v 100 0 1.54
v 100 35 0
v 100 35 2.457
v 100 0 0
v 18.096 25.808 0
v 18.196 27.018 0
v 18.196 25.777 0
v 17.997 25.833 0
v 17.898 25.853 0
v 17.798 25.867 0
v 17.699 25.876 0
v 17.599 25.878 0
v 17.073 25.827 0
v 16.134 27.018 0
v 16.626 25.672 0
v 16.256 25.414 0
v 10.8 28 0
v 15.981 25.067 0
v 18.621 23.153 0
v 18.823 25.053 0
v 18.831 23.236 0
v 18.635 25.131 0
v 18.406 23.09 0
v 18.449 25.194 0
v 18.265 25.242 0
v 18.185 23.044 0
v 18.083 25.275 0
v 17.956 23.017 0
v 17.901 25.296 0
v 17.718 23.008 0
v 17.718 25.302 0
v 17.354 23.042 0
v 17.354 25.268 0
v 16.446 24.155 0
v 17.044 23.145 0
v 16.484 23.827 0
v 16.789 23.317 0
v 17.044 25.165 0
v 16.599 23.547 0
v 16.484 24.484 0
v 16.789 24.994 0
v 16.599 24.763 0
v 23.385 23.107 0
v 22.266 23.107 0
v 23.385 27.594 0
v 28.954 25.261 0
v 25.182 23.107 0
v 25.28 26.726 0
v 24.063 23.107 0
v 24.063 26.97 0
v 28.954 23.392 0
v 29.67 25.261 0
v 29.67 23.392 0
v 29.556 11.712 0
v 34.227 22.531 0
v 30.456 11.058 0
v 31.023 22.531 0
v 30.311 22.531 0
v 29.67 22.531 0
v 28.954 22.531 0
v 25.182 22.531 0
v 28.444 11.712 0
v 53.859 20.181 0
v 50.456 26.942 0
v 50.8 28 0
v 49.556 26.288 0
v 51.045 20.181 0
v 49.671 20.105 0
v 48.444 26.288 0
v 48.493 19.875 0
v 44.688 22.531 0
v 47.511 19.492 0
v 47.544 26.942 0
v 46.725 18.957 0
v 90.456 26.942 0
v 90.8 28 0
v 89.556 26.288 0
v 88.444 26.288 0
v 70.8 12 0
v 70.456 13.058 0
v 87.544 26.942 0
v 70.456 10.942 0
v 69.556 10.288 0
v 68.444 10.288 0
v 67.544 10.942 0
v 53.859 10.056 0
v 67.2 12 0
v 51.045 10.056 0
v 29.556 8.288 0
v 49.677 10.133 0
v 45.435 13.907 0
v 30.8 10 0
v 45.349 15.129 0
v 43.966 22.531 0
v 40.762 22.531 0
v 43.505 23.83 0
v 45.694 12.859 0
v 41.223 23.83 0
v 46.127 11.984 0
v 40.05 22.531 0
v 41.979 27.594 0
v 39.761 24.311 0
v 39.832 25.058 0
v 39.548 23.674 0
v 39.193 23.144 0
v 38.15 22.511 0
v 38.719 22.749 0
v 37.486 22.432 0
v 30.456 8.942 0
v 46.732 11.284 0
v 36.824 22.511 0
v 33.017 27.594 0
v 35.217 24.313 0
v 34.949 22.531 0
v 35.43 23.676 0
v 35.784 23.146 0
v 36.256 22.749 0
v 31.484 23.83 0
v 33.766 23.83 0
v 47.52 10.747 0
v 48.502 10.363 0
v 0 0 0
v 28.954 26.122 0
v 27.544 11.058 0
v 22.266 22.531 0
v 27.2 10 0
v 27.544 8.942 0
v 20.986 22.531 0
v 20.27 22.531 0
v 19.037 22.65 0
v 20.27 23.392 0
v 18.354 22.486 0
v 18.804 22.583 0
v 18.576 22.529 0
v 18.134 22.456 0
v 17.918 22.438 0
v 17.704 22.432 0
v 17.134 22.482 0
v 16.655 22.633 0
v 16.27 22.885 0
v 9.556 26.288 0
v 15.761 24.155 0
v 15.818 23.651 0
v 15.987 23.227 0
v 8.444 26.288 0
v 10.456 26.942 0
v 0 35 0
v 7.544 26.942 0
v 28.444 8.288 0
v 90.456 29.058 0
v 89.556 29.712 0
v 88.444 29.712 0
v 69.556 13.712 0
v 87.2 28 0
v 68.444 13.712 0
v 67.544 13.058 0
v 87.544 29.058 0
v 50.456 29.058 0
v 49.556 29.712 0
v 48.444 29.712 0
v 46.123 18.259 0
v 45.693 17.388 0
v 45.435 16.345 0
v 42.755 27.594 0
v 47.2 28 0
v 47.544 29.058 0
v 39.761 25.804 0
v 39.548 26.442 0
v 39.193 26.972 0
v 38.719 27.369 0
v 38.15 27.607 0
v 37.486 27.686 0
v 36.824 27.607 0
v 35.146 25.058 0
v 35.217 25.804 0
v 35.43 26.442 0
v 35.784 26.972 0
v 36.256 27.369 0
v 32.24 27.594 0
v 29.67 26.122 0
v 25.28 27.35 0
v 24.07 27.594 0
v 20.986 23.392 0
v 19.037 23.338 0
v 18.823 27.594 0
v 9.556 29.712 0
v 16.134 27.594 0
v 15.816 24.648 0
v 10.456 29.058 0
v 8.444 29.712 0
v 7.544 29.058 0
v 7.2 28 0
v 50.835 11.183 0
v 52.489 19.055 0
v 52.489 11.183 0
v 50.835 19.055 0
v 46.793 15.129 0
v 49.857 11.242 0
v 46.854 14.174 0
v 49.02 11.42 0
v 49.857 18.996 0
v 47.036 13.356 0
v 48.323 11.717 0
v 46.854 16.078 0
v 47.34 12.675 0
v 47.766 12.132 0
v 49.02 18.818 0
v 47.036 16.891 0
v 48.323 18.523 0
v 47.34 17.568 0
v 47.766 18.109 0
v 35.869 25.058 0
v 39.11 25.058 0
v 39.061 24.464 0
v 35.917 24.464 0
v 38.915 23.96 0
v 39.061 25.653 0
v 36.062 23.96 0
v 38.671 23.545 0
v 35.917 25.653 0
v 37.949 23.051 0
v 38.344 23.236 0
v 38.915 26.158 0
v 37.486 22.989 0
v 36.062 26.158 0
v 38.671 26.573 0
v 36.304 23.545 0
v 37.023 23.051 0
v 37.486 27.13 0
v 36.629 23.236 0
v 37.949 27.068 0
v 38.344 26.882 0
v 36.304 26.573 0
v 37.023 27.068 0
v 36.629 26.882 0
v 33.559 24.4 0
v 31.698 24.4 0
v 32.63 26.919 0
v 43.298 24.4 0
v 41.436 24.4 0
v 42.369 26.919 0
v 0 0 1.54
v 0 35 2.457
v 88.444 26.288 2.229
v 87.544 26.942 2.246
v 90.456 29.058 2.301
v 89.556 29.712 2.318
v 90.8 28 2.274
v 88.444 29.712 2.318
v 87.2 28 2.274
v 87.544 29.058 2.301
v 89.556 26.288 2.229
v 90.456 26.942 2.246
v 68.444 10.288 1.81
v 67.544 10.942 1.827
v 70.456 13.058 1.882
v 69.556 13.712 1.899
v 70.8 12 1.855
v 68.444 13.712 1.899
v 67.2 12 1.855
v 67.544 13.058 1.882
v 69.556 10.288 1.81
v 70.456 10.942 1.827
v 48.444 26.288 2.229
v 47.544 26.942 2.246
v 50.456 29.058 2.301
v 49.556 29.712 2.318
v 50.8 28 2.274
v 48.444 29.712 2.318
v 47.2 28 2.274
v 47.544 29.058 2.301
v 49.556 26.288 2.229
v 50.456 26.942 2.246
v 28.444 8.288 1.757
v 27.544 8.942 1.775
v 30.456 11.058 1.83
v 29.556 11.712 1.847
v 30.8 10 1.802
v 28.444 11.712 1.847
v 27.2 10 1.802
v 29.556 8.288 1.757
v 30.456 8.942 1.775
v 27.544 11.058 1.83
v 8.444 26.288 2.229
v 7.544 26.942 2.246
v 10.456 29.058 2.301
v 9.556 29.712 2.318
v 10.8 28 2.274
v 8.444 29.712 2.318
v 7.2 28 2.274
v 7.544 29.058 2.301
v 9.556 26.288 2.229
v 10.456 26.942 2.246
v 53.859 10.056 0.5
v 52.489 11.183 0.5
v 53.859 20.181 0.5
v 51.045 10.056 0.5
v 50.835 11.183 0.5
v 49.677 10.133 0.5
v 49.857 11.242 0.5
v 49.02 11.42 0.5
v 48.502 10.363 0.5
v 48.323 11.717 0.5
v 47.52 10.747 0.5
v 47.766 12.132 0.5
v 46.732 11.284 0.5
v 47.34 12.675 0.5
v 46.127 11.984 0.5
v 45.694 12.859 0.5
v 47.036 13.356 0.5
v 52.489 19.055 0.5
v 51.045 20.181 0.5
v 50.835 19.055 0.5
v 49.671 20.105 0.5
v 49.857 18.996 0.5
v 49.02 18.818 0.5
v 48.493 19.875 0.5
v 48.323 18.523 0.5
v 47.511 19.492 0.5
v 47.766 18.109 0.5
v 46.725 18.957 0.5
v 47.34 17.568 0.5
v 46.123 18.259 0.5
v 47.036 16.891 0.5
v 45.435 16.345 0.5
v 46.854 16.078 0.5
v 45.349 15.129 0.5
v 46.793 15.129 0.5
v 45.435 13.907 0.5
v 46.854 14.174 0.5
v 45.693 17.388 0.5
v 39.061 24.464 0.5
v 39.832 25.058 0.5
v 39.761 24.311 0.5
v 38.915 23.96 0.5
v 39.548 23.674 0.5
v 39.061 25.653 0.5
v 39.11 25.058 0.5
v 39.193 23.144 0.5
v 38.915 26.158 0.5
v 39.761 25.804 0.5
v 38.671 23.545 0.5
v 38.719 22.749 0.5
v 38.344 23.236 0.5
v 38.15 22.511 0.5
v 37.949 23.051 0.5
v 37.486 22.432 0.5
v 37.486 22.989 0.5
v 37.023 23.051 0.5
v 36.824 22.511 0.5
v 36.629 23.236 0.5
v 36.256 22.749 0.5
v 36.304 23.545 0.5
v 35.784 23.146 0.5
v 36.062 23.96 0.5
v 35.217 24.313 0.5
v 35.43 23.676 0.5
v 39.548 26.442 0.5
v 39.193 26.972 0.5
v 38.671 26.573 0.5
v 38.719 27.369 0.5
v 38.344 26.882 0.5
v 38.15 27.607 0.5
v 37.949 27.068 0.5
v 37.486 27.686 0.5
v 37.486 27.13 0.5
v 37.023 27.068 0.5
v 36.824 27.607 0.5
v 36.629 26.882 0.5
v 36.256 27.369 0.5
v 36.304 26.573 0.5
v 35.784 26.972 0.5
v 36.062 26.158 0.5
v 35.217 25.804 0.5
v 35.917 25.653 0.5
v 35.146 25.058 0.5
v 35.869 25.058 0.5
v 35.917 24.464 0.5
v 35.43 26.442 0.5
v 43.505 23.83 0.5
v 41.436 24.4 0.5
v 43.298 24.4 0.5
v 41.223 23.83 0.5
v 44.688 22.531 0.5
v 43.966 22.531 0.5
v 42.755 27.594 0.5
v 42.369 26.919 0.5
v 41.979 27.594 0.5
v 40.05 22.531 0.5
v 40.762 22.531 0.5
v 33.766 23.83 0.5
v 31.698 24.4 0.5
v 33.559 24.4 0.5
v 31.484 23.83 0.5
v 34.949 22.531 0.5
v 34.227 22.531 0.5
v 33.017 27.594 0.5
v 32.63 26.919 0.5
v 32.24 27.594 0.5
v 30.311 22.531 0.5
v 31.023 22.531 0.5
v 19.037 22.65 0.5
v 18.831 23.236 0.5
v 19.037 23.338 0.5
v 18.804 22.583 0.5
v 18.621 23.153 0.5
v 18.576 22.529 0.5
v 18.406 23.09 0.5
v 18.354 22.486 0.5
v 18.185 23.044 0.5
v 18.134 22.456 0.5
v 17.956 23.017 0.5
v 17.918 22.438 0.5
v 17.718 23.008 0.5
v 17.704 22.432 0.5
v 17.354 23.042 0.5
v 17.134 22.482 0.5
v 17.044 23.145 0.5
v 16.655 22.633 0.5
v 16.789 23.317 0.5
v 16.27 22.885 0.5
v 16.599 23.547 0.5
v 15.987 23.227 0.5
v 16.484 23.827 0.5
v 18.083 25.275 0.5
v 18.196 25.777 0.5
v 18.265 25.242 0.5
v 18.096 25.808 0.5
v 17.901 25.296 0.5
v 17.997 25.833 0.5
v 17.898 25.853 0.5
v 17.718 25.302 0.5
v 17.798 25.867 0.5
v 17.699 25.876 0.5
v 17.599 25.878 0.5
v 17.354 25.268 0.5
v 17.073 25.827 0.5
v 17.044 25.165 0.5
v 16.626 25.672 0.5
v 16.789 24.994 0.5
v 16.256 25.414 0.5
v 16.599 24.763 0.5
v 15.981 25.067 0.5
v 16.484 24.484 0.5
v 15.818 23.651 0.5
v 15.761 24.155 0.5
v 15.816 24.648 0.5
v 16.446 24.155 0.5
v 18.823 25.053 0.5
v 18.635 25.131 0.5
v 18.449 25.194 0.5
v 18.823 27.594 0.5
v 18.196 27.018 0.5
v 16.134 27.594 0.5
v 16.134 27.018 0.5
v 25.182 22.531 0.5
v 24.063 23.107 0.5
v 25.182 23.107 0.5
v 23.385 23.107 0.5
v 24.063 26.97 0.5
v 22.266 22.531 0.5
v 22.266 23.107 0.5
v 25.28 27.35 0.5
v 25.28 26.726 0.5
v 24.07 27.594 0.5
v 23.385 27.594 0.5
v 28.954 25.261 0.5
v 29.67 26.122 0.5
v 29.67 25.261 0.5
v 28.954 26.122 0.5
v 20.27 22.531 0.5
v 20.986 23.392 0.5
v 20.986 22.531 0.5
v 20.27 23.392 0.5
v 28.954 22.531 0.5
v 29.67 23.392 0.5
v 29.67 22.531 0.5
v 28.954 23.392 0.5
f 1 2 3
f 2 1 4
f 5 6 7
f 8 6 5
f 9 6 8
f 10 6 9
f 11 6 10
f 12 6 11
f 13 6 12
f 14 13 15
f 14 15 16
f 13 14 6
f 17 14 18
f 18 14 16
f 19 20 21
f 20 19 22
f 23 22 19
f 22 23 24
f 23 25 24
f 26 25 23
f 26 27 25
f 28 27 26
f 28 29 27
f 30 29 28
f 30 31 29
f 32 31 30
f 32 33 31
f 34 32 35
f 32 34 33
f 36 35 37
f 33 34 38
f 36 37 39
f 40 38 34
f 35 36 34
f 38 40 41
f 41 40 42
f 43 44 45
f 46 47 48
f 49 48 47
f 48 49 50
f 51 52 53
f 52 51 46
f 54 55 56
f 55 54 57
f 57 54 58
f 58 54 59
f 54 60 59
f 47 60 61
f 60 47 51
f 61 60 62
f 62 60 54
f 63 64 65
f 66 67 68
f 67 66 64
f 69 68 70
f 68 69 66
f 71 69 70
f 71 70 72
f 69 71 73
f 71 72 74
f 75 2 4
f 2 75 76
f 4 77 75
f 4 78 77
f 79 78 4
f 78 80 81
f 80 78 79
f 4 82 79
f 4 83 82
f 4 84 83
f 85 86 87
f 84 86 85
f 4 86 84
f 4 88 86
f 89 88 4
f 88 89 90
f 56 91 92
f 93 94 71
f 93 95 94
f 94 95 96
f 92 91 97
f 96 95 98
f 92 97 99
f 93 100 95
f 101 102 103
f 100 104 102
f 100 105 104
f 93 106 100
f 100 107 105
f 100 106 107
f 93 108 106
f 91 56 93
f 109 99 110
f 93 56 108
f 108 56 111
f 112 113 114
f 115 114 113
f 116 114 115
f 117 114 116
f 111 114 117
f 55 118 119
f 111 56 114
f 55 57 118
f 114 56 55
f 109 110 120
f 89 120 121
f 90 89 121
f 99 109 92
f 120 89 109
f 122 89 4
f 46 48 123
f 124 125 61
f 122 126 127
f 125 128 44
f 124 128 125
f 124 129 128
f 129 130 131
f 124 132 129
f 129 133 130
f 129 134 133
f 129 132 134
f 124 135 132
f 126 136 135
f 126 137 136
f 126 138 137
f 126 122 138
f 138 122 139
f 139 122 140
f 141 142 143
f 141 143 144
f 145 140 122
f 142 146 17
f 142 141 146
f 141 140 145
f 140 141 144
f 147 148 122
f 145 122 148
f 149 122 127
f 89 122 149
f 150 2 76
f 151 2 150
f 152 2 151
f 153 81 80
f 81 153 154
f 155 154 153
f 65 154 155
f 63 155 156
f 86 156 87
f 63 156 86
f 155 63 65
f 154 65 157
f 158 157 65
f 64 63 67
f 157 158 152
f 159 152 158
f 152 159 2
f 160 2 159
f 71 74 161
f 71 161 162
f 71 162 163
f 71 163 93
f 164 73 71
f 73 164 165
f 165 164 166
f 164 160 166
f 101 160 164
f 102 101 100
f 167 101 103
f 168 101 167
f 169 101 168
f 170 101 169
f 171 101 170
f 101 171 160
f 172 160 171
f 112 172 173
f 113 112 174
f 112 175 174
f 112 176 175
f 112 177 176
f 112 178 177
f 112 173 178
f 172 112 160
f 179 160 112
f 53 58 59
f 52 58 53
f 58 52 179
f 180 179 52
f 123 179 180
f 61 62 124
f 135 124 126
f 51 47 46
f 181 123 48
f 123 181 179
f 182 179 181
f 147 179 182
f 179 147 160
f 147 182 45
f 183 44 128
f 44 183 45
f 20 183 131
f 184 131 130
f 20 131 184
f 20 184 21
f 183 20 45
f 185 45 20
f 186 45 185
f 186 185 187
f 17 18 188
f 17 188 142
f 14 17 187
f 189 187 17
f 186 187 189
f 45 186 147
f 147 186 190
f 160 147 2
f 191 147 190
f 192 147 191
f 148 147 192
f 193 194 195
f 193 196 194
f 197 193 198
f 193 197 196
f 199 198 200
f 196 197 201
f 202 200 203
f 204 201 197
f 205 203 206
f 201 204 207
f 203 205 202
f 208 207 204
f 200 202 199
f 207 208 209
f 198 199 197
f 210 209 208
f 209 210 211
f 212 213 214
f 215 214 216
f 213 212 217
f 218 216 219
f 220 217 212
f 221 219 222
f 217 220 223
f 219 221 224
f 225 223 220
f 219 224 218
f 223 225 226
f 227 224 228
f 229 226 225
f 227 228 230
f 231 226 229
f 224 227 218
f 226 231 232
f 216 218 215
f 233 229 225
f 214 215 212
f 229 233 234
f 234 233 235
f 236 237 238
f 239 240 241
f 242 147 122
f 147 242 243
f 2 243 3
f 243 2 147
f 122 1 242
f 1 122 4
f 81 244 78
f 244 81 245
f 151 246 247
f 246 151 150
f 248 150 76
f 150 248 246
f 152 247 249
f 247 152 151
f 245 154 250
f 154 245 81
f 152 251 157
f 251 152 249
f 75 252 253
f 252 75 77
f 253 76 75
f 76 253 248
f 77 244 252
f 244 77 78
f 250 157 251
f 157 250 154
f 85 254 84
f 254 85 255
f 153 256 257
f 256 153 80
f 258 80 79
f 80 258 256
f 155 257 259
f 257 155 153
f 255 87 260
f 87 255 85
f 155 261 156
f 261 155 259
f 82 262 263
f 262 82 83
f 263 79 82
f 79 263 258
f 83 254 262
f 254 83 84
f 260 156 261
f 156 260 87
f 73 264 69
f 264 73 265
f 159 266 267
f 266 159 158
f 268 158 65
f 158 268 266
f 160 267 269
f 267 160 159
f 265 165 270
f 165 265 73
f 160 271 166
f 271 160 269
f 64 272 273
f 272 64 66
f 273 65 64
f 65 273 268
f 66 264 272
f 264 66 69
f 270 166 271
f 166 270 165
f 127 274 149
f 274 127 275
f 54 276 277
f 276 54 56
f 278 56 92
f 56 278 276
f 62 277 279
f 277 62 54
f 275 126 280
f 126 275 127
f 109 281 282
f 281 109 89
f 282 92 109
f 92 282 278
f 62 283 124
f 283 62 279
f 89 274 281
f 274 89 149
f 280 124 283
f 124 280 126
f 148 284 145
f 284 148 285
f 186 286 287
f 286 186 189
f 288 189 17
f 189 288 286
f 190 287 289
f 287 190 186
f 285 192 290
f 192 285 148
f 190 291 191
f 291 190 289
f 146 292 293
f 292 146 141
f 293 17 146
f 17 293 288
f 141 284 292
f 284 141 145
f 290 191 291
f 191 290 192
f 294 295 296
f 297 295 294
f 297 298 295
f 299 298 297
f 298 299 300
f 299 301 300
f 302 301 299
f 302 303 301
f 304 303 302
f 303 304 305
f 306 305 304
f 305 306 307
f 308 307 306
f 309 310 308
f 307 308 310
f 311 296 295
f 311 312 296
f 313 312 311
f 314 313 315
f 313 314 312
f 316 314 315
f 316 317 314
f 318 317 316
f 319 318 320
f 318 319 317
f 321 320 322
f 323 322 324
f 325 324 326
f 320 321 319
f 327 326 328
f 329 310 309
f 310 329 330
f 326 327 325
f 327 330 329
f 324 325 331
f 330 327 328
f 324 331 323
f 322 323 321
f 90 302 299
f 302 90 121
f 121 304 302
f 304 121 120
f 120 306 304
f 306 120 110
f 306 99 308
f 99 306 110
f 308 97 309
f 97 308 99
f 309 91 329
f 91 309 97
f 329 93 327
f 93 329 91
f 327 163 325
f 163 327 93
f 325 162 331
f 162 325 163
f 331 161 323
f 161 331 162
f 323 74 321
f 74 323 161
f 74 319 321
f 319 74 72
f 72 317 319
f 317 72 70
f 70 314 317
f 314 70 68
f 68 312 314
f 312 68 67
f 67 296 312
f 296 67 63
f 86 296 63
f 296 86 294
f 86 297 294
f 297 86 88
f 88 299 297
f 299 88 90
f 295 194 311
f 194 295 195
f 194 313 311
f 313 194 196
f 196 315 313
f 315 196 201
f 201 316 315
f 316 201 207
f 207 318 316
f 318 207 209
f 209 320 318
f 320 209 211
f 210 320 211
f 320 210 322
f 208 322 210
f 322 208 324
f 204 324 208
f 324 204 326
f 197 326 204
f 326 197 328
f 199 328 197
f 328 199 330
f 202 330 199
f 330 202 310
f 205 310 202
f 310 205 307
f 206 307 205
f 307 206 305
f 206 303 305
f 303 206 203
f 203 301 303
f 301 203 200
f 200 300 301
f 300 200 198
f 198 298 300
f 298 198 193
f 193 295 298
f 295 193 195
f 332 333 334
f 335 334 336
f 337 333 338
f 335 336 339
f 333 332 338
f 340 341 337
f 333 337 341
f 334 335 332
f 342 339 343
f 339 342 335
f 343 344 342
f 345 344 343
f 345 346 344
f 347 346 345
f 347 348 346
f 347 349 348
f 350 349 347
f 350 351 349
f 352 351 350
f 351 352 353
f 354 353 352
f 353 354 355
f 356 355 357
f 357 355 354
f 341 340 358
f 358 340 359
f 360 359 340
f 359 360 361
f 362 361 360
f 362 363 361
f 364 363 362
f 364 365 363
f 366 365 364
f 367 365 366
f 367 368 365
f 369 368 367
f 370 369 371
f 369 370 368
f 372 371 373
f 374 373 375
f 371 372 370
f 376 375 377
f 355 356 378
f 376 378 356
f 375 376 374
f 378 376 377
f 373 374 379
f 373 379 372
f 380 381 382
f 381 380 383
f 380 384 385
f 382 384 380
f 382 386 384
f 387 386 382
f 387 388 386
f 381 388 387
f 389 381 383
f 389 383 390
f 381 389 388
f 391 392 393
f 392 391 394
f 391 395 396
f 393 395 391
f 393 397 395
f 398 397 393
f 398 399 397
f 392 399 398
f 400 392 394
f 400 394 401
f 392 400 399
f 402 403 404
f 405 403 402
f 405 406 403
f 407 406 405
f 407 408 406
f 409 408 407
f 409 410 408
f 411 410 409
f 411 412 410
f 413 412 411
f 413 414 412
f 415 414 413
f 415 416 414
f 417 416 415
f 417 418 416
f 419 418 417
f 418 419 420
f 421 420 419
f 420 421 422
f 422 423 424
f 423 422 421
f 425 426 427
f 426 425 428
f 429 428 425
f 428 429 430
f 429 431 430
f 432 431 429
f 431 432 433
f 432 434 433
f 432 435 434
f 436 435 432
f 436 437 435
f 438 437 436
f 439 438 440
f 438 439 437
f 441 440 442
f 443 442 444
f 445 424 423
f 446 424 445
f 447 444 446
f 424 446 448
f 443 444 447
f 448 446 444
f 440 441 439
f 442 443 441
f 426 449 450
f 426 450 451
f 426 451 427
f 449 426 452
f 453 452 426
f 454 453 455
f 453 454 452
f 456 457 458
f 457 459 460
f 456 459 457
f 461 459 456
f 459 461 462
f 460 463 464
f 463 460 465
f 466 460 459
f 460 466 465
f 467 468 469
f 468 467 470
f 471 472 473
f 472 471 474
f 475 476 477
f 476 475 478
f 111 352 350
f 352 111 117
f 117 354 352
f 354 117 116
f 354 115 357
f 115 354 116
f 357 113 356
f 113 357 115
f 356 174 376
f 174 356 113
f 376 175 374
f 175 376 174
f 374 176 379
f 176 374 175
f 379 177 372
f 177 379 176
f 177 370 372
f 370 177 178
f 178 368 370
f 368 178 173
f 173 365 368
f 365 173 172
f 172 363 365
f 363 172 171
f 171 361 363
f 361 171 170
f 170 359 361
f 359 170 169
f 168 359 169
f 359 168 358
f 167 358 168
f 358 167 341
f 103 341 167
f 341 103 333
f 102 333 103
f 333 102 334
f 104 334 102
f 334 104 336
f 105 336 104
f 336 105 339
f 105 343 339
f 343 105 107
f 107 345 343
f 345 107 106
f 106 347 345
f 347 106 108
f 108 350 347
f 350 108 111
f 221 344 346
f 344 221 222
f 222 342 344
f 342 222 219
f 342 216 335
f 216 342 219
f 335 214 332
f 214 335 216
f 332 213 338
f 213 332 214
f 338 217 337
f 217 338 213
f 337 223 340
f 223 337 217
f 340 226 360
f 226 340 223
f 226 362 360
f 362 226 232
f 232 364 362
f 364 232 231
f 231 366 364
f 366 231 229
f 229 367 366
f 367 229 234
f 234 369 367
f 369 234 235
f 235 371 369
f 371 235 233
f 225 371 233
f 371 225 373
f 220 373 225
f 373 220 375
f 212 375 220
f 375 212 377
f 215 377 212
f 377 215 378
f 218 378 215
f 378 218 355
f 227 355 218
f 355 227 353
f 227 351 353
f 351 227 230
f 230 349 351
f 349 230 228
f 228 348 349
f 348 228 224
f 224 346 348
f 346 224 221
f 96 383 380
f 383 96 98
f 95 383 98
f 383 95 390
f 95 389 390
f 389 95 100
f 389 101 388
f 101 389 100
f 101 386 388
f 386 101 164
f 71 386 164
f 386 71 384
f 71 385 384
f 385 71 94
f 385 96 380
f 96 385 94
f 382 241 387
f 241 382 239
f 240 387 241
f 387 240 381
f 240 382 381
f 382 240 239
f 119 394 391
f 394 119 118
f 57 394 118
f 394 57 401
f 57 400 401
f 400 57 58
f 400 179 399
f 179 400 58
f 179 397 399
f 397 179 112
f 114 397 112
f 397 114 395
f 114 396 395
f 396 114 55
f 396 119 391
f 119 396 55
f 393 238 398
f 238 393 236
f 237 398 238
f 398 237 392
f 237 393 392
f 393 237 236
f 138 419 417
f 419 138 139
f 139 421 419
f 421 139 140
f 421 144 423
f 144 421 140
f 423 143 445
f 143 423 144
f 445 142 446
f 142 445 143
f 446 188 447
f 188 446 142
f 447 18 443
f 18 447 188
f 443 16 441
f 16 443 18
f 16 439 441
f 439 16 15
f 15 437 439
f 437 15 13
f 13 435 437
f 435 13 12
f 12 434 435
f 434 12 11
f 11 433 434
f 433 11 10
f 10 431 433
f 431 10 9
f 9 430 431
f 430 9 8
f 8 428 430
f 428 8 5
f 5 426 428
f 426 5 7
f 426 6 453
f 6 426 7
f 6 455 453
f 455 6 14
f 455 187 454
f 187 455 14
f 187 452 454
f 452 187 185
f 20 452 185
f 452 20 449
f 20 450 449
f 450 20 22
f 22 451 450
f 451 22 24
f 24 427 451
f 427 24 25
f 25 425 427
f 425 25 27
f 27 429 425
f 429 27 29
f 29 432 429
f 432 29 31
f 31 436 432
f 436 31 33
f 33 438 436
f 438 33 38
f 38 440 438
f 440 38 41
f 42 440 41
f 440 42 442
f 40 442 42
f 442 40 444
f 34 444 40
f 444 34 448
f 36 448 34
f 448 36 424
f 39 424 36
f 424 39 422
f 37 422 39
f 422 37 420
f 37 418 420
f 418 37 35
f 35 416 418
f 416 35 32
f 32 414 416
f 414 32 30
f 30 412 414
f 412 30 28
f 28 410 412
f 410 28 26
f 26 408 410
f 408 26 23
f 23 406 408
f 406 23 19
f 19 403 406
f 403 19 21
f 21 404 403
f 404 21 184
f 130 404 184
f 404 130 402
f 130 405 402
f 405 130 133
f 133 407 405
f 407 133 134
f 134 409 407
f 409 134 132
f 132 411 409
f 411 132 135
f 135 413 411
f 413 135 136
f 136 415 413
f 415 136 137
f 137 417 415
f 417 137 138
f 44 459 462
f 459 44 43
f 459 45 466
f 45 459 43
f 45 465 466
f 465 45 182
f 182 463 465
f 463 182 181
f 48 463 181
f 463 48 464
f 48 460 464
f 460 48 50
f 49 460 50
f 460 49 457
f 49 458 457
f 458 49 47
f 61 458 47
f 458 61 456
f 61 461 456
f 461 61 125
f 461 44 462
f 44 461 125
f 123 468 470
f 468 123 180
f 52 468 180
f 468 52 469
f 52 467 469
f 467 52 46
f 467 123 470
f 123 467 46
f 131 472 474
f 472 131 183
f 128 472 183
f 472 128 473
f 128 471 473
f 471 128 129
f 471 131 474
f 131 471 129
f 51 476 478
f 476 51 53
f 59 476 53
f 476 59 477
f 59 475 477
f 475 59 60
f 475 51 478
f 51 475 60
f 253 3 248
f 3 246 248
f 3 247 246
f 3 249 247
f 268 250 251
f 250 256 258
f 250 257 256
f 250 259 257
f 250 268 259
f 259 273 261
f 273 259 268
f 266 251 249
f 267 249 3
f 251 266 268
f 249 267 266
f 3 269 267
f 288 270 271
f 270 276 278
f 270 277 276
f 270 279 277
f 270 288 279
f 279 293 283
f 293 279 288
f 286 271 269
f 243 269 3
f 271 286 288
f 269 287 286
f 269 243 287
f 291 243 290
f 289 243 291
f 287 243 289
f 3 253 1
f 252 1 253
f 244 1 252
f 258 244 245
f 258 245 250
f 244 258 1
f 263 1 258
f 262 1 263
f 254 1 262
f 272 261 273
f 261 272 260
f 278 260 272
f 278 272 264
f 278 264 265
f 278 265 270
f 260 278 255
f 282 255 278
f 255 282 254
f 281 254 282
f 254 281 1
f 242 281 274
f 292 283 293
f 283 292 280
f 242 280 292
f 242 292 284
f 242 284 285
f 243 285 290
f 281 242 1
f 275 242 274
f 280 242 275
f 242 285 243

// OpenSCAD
// file: ../lib/naca4.scad
// Naca4.scad - library for parametric airfoils of 4 digit NACA series
// Code: Rudolf Huttary, Berlin
// June 2015
// commercial use prohibited


// general use: for more examples refer to sampler.scad
// naca = naca digits or 3el vector  (default = 12 or [0, 0, .12])
// L    = chord length [mm]      (default= 100)
// N    = # sample points        (default= 81)
// h    = height [mm]            (default= 1)
// open = close at the thin end? (default = true)
// two equivalent example calls
 airfoil(naca = 2408, L = 60, N=1001, h = 30, open = false);
// airfoil(naca = [.2, .4, .32], L = 60, N=1001, h = 30, open = false);

module help()
{
  echo(str("\n\nList of signatures in lib:\n=================\n",
  "module airfoil(naca=2412, L = 100, N = 81, h = 1, open = false) - renders airfoil object\n",
  "module airfoil(naca=[.2, .4, .12], L = 100, N = 81, h = 1, open = false) - renders airfoil object using percentage for camber,  camber distance and thicknes\n",
  "function airfoil_data(naca=12, L = 100, N = 81, open = false)\n",
  "=================\n"));
}

help();
// this is the object
module airfoil(naca=12, L = 100, N = 81, h = 1, open = false)
{
  linear_extrude(height = h)
  polygon(points = airfoil_data(naca, L, N, open));
}

module hollow_airfoil(naca=12, L = 100, N = 81, h = 1, open = false, wall_thickness = 1)
{
    if (open){
        linear_extrude(height = h)

        if (wall_thickness>0){
            difference(){
                polygon(points = airfoil_data(naca, L, N, false));
                offset(delta = - wall_thickness, chamfer = false) polygon(points = airfoil_data(naca, L, N, open = false));
            }
        }
        else{
            difference(){
                offset(delta = - wall_thickness, chamfer = false) polygon(points = airfoil_data(naca, L, N, open = false));
                polygon(points = airfoil_data(naca, L, N, false));
            }
        }
    }
    else{

        linear_extrude(height = abs(wall_thickness))
            polygon(points = airfoil_data(naca, L, N, false));

        linear_extrude(height = h)
            difference(){
                polygon(points = airfoil_data(naca, L, N, open));
                offset(delta = - wall_thickness) polygon(points = airfoil_data(naca, L, N, open = false));
            }

        translate([0,0, h - wall_thickness])
            linear_extrude(height = abs(wall_thickness))
                polygon(points = airfoil_data(naca, L, N, false));

    }
}


// this is the main function providing the airfoil data
function airfoil_data(naca=12, L = 100, N = 81, open = false) =
  let(Na = len(naca)!=3?NACA(naca):naca)
  let(A = [.2969, -0.126, -.3516, .2843, open?-0.1015:-0.1036])
  [for (b=[-180:360/(N):179.99])
    let (x = (1-cos(b))/2)
    let(yt = sign(b)*Na[2]/.2*(A*[sqrt(x), x, x*x, x*x*x, x*x*x*x]))
    Na[0]==0?L*[x, yt]:L*camber(x, yt, Na[0], Na[1], sign(b))];


function trailing_edge_angle(naca=12, open = false) =
  let(Na = len(naca)!=3?NACA(naca):naca)
  let(A = [.2969, -0.126, -.3516, .2843, open?-0.1015:-0.1036])
  let (x =0.999)  // set x near to airfoil trailing edge
  let(yt = Na[2]/.2*(A*[sqrt(x), x, x*x, x*x*x, x*x*x*x])) // calculate distance from x-axis at previously set position
  atan2(yt,1-x);  // calculate angle of triangle between end of airfoil. The triange height corresponds to previously calculated distance from x-axis

function surface_angle(x = 0.5, naca=12, open = false) =
  let(Na = len(naca)!=3?NACA(naca):naca)
  let(A = [0.2969, -0.126, -0.3516, 0.2843, open?-0.1015:-0.1036])
  let(dy = Na[2]/0.2*(A*[(1/2)*(1/sqrt(x)), 1, 2*x, 3*x*x, 4*x*x*x])) // calculate derivative of airfoil function at the x point
  atan(dy);  // calculate  the angle from function derivative

function surface_distance(x = 0.5, naca=12, open = false) =
  let(Na = len(naca)!=3?NACA(naca):naca)
  let(A = [0.2969, -0.126, -0.3516, 0.2843, open?-0.1015:-0.1036])
  Na[2]/.2*(A*[sqrt(x), x, x*x, x*x*x, x*x*x*x]); // calculate distance from x-axis at previously set position

// helper functions
function NACA(naca) =
  let (M = floor(naca/1000))
  let (P = floor((naca-M*1000)/100))
  [M/100, P/10, floor(naca-M*1000-P*100)/100];

function camber(x, y, M, P, upper) =
  let(yc = (x<P)?M/P/P*(2*P*x-x*x): M/(1-P)/(1-P)*(1 - 2*P + 2*P*x -x*x))
  let(dy = (x<P)?2*M/P/P*(P-x):2*M/(1-P)/(1-P)*(P-x))
  let(th = atan(dy))
  [upper ? x - y*sin(th):x + y*sin(th), upper ? yc + y*cos(th):yc - y*cos(th)];
// file: ../666_1247.scad
use <./lib/naca4.scad>
include <../parameters.scad>

module 666_1247(angle_of_attact){
	union(){
		difference(){
			cube([100,35,12]);

			translate([9+ 20 + 20 + 20 + 20,35-7,-1])
				cylinder (h = 20, r = 3.6/2, $fn = 10);

			translate([9 + 20 + 20 + 20, 35-23, -1])	
				cylinder (h = 20, r = 3.6/2, $fn = 10);

			translate([9 + 20 + 20,35-7,-1])	
    			cylinder (h = 20, r = 3.6/2, $fn = 10);

			translate([9 + 20, 35-25, -1])	
    			cylinder (h = 20, r = 3.6/2, $fn = 10);

			translate([9,35-7,-1])	
				cylinder (h = 20, r = 3.6/2, $fn = 10);

            translate([50, 15, 11.5])
                linear_extrude(0.5) 
                    text("H", size = 10, halign = "center", valign = "center", font = "PT Sans");

            translate([30, 25, 11.5])
                linear_extrude(0.5) 
                    text( str("AOA: ", angle_of_attact), size = 5, halign = "center", valign = "center", font = "PT Sans");

            translate([50, 15, 0.5])
                rotate([0,180, 0])       
                linear_extrude(0.5) 
                    text("D", size = 10, halign = "center", valign = "center", font = "PT Sans");

            translate([30, 25, 0.5])
                rotate([0,180, 0])       
                linear_extrude(0.5) 
                    text(str("AOA: ", angle_of_attact), size = 5, halign = "center", valign = "center", font = "PT Sans");

            translate([0,35/2,12/2])      // set AOA
                rotate([angle_of_attact,0,0])       
                    cube([400, 400, 8], center = true);
		}
	}
}

module 666_1247_H(angle_of_attact){
    intersection(){
        translate([-1,0,5])      
            cube([200, 100, 20]);
        666_1247(angle_of_attact);
    }
}

module 666_1247_D(angle_of_attact){
    intersection(){
        translate([-1,0,0])      
            cube([200, 100, 5]);
        666_1247(angle_of_attact);
    }
}


666_1247_H(rotor_blade_AOA);

666_1247_D(rotor_blade_AOA);
// main file
include <../../parameters.scad>
use <../666_1247.scad>

666_1247_D(rotor_blade_AOA);
